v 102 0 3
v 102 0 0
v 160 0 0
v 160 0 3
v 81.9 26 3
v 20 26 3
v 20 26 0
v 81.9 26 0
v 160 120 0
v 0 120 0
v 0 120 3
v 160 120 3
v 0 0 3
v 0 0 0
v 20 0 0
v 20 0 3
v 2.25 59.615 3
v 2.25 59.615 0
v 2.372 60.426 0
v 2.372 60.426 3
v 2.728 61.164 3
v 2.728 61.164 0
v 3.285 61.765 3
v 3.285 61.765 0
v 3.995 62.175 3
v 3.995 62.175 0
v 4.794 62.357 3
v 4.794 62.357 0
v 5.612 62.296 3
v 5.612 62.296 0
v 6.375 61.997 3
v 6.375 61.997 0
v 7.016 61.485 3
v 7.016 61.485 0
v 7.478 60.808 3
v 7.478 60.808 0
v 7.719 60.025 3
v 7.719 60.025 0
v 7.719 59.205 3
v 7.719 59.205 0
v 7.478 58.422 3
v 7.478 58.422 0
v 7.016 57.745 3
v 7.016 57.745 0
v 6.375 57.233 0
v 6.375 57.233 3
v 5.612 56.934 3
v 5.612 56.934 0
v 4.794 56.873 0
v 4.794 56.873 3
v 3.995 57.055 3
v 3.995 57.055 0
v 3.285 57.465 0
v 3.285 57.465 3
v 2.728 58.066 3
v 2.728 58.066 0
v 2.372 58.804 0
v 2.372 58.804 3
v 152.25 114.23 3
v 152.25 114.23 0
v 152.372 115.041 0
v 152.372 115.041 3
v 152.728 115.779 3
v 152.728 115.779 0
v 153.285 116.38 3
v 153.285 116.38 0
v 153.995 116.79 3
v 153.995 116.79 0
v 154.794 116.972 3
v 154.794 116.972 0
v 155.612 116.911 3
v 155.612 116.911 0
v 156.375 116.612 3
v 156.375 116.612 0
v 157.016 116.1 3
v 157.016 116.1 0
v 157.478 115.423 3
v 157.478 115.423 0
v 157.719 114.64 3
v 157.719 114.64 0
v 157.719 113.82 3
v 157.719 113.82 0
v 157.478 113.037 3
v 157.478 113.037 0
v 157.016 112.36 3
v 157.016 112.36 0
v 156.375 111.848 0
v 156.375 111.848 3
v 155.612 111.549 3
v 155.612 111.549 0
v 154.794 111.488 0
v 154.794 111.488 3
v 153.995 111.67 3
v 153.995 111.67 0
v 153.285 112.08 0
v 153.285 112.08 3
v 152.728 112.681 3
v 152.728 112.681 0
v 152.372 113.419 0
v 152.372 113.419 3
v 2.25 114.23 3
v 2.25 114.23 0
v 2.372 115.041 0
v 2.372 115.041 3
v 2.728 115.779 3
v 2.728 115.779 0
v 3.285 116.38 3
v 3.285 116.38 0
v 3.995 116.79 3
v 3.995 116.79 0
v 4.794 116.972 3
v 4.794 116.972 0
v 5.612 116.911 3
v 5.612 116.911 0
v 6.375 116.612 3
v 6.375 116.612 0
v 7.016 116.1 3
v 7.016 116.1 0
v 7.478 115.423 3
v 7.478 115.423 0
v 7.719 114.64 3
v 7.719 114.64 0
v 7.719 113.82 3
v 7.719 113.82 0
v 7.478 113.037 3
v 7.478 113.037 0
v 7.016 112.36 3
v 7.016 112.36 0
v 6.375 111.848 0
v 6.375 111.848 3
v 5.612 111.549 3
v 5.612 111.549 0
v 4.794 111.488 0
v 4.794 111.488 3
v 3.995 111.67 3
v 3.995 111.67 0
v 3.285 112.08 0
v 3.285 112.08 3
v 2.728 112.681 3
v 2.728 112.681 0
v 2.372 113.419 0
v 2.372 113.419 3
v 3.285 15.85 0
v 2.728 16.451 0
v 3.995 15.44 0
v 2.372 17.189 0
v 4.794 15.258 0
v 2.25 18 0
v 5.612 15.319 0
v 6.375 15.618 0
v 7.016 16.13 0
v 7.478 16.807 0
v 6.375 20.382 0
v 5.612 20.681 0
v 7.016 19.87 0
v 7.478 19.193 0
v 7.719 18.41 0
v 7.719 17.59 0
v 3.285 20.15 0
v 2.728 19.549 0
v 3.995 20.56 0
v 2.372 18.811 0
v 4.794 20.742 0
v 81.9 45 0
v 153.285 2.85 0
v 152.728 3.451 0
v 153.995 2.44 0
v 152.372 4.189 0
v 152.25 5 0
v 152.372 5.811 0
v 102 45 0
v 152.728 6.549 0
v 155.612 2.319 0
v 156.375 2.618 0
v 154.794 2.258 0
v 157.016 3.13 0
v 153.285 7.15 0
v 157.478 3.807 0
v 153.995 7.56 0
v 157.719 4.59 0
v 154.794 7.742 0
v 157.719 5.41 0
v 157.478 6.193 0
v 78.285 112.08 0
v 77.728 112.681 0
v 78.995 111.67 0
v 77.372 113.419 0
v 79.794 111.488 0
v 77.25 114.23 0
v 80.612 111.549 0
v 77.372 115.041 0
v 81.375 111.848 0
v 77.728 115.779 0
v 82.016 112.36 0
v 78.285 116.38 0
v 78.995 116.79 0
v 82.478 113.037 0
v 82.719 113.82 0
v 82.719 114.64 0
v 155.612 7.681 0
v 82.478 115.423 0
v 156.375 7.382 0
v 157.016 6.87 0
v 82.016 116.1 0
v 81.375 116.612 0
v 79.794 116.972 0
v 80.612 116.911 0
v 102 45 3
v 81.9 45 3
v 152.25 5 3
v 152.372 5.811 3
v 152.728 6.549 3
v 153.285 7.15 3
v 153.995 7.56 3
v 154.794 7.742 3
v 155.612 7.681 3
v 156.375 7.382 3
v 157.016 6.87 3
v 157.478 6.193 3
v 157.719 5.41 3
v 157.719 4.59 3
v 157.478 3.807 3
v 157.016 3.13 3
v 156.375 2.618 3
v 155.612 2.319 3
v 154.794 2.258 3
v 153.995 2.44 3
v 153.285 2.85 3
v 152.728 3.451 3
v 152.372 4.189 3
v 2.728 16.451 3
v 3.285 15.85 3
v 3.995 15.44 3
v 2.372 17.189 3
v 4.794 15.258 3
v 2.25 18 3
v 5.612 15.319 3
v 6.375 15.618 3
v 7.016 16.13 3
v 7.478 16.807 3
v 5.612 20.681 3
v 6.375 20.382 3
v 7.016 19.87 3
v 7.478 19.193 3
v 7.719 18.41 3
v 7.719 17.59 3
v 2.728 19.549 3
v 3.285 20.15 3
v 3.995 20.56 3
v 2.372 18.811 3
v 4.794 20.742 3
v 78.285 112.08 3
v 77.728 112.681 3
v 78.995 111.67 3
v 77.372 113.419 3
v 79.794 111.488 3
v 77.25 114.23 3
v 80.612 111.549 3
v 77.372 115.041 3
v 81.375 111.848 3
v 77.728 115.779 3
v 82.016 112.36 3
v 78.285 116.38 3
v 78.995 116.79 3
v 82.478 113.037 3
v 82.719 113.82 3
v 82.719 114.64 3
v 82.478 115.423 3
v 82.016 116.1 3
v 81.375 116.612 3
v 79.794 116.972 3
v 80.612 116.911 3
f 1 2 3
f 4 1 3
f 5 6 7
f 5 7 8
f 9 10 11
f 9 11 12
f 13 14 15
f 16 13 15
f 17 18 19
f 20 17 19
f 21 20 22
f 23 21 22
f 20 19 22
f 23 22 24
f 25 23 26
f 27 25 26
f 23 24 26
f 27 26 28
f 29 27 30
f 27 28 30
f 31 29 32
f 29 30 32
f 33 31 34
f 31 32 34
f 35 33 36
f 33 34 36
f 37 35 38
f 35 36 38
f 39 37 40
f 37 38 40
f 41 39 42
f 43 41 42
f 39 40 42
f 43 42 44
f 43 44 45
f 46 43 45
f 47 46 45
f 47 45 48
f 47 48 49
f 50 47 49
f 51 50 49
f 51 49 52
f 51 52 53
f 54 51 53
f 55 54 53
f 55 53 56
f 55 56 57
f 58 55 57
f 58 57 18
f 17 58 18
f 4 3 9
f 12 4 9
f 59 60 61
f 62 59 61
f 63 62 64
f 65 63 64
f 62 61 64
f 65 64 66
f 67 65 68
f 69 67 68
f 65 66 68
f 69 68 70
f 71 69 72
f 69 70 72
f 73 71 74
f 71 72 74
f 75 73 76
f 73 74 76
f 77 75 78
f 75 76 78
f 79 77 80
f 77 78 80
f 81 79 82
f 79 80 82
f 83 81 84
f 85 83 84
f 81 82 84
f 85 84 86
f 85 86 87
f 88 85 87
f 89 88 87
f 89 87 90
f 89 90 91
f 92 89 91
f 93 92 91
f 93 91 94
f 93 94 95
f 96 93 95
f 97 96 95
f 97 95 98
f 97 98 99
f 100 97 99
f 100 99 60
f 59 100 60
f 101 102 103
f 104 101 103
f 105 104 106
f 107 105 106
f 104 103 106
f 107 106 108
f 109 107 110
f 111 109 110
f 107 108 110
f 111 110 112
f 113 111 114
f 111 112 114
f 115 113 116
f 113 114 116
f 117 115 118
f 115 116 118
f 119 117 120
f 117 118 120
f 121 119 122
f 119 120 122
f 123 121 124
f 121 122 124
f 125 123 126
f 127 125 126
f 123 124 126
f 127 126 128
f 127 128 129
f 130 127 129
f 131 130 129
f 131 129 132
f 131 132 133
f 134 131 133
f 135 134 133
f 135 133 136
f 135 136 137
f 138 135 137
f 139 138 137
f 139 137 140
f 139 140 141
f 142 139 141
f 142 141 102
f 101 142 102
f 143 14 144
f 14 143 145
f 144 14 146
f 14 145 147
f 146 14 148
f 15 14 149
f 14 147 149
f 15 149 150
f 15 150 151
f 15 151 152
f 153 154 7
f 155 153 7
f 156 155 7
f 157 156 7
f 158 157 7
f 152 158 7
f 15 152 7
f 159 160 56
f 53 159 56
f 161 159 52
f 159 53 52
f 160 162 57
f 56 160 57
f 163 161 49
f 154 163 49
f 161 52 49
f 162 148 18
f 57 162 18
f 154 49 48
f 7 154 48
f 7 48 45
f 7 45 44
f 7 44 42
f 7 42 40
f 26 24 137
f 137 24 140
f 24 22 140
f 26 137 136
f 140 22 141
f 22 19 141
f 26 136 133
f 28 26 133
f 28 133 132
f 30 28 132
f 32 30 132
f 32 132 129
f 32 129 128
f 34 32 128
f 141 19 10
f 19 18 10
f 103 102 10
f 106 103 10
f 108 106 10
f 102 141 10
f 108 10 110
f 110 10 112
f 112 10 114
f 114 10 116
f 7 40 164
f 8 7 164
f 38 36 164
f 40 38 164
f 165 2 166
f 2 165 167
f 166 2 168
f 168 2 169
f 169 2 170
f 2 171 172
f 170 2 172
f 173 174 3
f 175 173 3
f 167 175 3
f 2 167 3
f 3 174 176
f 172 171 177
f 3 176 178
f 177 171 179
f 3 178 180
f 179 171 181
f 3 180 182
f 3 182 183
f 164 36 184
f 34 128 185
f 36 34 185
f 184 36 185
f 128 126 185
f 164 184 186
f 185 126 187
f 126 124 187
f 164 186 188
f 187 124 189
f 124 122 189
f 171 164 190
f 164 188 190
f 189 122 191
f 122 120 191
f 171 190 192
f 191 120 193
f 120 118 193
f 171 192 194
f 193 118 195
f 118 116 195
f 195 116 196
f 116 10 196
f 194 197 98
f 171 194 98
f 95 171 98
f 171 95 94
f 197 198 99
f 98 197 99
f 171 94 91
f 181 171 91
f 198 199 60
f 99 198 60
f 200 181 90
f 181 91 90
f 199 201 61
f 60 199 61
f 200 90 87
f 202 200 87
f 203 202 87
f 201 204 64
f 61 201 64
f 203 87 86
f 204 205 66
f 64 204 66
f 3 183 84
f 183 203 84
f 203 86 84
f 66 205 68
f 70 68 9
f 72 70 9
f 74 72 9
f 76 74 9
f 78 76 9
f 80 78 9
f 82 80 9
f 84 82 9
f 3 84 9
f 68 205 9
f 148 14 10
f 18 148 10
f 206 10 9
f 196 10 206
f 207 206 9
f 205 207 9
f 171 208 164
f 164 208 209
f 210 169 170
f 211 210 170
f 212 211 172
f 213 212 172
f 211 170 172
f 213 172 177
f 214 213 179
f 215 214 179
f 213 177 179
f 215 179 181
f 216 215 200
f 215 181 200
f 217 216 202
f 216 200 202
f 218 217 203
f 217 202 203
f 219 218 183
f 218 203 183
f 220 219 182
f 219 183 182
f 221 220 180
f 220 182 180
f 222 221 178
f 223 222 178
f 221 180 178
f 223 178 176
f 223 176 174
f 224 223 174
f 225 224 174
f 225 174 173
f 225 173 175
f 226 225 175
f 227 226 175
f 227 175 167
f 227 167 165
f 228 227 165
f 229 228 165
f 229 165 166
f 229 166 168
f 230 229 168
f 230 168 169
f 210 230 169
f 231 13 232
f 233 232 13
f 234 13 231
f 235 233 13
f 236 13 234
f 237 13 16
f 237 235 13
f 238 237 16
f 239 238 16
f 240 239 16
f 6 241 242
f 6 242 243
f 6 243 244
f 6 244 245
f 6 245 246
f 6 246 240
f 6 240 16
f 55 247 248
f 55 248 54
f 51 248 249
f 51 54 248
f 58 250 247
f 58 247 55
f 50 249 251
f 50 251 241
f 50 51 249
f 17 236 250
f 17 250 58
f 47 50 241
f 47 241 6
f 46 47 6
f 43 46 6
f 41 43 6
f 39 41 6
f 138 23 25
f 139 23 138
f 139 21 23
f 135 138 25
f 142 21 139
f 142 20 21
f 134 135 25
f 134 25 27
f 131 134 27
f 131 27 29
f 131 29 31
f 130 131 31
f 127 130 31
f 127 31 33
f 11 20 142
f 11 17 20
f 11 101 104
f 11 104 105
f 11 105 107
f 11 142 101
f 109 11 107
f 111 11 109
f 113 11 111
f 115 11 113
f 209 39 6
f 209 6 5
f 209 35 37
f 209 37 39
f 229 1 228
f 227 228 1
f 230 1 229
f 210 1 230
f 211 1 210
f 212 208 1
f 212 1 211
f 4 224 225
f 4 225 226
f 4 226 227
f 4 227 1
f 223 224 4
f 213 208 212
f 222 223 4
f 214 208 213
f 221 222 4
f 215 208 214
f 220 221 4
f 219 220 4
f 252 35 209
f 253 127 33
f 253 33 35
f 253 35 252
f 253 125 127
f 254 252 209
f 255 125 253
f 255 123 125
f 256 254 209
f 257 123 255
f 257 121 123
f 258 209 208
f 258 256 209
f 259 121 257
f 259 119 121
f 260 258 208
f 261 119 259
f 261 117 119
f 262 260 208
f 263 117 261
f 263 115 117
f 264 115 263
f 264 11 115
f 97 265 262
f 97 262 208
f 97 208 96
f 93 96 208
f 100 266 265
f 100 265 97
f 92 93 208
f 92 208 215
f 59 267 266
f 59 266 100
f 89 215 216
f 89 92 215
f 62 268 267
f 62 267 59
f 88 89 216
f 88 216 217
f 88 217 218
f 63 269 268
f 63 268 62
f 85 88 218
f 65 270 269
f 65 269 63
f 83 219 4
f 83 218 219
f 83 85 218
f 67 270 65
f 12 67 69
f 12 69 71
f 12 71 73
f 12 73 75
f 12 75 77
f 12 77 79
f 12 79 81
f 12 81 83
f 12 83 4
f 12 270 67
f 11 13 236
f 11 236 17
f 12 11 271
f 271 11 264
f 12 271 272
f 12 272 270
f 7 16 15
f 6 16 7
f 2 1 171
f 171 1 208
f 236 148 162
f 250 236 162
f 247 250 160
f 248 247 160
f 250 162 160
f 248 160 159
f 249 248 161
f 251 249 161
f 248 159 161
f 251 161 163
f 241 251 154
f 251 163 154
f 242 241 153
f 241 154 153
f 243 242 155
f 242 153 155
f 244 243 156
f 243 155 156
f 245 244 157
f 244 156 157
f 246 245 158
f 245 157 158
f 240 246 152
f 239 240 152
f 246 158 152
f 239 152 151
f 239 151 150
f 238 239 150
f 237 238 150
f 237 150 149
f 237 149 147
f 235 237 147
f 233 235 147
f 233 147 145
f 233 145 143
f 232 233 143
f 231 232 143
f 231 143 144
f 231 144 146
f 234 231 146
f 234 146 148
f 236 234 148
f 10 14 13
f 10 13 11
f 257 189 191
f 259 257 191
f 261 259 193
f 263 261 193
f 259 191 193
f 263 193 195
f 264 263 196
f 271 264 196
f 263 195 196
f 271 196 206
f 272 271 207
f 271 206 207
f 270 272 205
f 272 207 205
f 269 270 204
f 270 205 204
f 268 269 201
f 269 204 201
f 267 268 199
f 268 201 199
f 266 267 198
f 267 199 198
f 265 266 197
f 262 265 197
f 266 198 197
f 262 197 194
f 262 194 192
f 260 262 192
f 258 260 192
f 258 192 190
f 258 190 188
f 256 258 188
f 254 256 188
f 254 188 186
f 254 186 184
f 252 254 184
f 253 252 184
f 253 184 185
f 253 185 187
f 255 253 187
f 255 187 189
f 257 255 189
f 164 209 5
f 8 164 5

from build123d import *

# Parameters (mm, degrees)
SKETCH1_W            = 160
SKETCH1_H            = 120
BOSS_EXTRUDE1_DEPTH  = 3
SKETCH2_W            = 61.9
SKETCH2_H            = 26
CUT_EXTRUDE1_DEPTH   = 10
M5_CLEARANCE_HOLE1_D = 5.5


with BuildPart() as part:
    # Sketch1 → Boss-Extrude1 (new body)
    with BuildSketch(Plane.XY):
        with Locations((80, 60)):
            Rectangle(SKETCH1_W, SKETCH1_H)
    extrude(amount=BOSS_EXTRUDE1_DEPTH)

    # Sketch2 → Cut-Extrude1 (cut)
    with BuildSketch(Plane.XY.offset(3)):
        Polygon((81.9, 26), (81.9, 0), (102, 0), (102, 45), (81.9, 45), align=None)
        with Locations((50.95, 13)):
            Rectangle(SKETCH2_W, SKETCH2_H)
    extrude(amount=-CUT_EXTRUDE1_DEPTH, mode=Mode.SUBTRACT)

    # M5 Clearance Hole1 (through all)
    with Locations(Plane.XY.offset(3)):
        with Locations((5, 114.23), (155, 5), (155, 114.23), (80, 114.23), (5, 59.615), (5, 18)):
            Hole(M5_CLEARANCE_HOLE1_D / 2)


solid = part.part
